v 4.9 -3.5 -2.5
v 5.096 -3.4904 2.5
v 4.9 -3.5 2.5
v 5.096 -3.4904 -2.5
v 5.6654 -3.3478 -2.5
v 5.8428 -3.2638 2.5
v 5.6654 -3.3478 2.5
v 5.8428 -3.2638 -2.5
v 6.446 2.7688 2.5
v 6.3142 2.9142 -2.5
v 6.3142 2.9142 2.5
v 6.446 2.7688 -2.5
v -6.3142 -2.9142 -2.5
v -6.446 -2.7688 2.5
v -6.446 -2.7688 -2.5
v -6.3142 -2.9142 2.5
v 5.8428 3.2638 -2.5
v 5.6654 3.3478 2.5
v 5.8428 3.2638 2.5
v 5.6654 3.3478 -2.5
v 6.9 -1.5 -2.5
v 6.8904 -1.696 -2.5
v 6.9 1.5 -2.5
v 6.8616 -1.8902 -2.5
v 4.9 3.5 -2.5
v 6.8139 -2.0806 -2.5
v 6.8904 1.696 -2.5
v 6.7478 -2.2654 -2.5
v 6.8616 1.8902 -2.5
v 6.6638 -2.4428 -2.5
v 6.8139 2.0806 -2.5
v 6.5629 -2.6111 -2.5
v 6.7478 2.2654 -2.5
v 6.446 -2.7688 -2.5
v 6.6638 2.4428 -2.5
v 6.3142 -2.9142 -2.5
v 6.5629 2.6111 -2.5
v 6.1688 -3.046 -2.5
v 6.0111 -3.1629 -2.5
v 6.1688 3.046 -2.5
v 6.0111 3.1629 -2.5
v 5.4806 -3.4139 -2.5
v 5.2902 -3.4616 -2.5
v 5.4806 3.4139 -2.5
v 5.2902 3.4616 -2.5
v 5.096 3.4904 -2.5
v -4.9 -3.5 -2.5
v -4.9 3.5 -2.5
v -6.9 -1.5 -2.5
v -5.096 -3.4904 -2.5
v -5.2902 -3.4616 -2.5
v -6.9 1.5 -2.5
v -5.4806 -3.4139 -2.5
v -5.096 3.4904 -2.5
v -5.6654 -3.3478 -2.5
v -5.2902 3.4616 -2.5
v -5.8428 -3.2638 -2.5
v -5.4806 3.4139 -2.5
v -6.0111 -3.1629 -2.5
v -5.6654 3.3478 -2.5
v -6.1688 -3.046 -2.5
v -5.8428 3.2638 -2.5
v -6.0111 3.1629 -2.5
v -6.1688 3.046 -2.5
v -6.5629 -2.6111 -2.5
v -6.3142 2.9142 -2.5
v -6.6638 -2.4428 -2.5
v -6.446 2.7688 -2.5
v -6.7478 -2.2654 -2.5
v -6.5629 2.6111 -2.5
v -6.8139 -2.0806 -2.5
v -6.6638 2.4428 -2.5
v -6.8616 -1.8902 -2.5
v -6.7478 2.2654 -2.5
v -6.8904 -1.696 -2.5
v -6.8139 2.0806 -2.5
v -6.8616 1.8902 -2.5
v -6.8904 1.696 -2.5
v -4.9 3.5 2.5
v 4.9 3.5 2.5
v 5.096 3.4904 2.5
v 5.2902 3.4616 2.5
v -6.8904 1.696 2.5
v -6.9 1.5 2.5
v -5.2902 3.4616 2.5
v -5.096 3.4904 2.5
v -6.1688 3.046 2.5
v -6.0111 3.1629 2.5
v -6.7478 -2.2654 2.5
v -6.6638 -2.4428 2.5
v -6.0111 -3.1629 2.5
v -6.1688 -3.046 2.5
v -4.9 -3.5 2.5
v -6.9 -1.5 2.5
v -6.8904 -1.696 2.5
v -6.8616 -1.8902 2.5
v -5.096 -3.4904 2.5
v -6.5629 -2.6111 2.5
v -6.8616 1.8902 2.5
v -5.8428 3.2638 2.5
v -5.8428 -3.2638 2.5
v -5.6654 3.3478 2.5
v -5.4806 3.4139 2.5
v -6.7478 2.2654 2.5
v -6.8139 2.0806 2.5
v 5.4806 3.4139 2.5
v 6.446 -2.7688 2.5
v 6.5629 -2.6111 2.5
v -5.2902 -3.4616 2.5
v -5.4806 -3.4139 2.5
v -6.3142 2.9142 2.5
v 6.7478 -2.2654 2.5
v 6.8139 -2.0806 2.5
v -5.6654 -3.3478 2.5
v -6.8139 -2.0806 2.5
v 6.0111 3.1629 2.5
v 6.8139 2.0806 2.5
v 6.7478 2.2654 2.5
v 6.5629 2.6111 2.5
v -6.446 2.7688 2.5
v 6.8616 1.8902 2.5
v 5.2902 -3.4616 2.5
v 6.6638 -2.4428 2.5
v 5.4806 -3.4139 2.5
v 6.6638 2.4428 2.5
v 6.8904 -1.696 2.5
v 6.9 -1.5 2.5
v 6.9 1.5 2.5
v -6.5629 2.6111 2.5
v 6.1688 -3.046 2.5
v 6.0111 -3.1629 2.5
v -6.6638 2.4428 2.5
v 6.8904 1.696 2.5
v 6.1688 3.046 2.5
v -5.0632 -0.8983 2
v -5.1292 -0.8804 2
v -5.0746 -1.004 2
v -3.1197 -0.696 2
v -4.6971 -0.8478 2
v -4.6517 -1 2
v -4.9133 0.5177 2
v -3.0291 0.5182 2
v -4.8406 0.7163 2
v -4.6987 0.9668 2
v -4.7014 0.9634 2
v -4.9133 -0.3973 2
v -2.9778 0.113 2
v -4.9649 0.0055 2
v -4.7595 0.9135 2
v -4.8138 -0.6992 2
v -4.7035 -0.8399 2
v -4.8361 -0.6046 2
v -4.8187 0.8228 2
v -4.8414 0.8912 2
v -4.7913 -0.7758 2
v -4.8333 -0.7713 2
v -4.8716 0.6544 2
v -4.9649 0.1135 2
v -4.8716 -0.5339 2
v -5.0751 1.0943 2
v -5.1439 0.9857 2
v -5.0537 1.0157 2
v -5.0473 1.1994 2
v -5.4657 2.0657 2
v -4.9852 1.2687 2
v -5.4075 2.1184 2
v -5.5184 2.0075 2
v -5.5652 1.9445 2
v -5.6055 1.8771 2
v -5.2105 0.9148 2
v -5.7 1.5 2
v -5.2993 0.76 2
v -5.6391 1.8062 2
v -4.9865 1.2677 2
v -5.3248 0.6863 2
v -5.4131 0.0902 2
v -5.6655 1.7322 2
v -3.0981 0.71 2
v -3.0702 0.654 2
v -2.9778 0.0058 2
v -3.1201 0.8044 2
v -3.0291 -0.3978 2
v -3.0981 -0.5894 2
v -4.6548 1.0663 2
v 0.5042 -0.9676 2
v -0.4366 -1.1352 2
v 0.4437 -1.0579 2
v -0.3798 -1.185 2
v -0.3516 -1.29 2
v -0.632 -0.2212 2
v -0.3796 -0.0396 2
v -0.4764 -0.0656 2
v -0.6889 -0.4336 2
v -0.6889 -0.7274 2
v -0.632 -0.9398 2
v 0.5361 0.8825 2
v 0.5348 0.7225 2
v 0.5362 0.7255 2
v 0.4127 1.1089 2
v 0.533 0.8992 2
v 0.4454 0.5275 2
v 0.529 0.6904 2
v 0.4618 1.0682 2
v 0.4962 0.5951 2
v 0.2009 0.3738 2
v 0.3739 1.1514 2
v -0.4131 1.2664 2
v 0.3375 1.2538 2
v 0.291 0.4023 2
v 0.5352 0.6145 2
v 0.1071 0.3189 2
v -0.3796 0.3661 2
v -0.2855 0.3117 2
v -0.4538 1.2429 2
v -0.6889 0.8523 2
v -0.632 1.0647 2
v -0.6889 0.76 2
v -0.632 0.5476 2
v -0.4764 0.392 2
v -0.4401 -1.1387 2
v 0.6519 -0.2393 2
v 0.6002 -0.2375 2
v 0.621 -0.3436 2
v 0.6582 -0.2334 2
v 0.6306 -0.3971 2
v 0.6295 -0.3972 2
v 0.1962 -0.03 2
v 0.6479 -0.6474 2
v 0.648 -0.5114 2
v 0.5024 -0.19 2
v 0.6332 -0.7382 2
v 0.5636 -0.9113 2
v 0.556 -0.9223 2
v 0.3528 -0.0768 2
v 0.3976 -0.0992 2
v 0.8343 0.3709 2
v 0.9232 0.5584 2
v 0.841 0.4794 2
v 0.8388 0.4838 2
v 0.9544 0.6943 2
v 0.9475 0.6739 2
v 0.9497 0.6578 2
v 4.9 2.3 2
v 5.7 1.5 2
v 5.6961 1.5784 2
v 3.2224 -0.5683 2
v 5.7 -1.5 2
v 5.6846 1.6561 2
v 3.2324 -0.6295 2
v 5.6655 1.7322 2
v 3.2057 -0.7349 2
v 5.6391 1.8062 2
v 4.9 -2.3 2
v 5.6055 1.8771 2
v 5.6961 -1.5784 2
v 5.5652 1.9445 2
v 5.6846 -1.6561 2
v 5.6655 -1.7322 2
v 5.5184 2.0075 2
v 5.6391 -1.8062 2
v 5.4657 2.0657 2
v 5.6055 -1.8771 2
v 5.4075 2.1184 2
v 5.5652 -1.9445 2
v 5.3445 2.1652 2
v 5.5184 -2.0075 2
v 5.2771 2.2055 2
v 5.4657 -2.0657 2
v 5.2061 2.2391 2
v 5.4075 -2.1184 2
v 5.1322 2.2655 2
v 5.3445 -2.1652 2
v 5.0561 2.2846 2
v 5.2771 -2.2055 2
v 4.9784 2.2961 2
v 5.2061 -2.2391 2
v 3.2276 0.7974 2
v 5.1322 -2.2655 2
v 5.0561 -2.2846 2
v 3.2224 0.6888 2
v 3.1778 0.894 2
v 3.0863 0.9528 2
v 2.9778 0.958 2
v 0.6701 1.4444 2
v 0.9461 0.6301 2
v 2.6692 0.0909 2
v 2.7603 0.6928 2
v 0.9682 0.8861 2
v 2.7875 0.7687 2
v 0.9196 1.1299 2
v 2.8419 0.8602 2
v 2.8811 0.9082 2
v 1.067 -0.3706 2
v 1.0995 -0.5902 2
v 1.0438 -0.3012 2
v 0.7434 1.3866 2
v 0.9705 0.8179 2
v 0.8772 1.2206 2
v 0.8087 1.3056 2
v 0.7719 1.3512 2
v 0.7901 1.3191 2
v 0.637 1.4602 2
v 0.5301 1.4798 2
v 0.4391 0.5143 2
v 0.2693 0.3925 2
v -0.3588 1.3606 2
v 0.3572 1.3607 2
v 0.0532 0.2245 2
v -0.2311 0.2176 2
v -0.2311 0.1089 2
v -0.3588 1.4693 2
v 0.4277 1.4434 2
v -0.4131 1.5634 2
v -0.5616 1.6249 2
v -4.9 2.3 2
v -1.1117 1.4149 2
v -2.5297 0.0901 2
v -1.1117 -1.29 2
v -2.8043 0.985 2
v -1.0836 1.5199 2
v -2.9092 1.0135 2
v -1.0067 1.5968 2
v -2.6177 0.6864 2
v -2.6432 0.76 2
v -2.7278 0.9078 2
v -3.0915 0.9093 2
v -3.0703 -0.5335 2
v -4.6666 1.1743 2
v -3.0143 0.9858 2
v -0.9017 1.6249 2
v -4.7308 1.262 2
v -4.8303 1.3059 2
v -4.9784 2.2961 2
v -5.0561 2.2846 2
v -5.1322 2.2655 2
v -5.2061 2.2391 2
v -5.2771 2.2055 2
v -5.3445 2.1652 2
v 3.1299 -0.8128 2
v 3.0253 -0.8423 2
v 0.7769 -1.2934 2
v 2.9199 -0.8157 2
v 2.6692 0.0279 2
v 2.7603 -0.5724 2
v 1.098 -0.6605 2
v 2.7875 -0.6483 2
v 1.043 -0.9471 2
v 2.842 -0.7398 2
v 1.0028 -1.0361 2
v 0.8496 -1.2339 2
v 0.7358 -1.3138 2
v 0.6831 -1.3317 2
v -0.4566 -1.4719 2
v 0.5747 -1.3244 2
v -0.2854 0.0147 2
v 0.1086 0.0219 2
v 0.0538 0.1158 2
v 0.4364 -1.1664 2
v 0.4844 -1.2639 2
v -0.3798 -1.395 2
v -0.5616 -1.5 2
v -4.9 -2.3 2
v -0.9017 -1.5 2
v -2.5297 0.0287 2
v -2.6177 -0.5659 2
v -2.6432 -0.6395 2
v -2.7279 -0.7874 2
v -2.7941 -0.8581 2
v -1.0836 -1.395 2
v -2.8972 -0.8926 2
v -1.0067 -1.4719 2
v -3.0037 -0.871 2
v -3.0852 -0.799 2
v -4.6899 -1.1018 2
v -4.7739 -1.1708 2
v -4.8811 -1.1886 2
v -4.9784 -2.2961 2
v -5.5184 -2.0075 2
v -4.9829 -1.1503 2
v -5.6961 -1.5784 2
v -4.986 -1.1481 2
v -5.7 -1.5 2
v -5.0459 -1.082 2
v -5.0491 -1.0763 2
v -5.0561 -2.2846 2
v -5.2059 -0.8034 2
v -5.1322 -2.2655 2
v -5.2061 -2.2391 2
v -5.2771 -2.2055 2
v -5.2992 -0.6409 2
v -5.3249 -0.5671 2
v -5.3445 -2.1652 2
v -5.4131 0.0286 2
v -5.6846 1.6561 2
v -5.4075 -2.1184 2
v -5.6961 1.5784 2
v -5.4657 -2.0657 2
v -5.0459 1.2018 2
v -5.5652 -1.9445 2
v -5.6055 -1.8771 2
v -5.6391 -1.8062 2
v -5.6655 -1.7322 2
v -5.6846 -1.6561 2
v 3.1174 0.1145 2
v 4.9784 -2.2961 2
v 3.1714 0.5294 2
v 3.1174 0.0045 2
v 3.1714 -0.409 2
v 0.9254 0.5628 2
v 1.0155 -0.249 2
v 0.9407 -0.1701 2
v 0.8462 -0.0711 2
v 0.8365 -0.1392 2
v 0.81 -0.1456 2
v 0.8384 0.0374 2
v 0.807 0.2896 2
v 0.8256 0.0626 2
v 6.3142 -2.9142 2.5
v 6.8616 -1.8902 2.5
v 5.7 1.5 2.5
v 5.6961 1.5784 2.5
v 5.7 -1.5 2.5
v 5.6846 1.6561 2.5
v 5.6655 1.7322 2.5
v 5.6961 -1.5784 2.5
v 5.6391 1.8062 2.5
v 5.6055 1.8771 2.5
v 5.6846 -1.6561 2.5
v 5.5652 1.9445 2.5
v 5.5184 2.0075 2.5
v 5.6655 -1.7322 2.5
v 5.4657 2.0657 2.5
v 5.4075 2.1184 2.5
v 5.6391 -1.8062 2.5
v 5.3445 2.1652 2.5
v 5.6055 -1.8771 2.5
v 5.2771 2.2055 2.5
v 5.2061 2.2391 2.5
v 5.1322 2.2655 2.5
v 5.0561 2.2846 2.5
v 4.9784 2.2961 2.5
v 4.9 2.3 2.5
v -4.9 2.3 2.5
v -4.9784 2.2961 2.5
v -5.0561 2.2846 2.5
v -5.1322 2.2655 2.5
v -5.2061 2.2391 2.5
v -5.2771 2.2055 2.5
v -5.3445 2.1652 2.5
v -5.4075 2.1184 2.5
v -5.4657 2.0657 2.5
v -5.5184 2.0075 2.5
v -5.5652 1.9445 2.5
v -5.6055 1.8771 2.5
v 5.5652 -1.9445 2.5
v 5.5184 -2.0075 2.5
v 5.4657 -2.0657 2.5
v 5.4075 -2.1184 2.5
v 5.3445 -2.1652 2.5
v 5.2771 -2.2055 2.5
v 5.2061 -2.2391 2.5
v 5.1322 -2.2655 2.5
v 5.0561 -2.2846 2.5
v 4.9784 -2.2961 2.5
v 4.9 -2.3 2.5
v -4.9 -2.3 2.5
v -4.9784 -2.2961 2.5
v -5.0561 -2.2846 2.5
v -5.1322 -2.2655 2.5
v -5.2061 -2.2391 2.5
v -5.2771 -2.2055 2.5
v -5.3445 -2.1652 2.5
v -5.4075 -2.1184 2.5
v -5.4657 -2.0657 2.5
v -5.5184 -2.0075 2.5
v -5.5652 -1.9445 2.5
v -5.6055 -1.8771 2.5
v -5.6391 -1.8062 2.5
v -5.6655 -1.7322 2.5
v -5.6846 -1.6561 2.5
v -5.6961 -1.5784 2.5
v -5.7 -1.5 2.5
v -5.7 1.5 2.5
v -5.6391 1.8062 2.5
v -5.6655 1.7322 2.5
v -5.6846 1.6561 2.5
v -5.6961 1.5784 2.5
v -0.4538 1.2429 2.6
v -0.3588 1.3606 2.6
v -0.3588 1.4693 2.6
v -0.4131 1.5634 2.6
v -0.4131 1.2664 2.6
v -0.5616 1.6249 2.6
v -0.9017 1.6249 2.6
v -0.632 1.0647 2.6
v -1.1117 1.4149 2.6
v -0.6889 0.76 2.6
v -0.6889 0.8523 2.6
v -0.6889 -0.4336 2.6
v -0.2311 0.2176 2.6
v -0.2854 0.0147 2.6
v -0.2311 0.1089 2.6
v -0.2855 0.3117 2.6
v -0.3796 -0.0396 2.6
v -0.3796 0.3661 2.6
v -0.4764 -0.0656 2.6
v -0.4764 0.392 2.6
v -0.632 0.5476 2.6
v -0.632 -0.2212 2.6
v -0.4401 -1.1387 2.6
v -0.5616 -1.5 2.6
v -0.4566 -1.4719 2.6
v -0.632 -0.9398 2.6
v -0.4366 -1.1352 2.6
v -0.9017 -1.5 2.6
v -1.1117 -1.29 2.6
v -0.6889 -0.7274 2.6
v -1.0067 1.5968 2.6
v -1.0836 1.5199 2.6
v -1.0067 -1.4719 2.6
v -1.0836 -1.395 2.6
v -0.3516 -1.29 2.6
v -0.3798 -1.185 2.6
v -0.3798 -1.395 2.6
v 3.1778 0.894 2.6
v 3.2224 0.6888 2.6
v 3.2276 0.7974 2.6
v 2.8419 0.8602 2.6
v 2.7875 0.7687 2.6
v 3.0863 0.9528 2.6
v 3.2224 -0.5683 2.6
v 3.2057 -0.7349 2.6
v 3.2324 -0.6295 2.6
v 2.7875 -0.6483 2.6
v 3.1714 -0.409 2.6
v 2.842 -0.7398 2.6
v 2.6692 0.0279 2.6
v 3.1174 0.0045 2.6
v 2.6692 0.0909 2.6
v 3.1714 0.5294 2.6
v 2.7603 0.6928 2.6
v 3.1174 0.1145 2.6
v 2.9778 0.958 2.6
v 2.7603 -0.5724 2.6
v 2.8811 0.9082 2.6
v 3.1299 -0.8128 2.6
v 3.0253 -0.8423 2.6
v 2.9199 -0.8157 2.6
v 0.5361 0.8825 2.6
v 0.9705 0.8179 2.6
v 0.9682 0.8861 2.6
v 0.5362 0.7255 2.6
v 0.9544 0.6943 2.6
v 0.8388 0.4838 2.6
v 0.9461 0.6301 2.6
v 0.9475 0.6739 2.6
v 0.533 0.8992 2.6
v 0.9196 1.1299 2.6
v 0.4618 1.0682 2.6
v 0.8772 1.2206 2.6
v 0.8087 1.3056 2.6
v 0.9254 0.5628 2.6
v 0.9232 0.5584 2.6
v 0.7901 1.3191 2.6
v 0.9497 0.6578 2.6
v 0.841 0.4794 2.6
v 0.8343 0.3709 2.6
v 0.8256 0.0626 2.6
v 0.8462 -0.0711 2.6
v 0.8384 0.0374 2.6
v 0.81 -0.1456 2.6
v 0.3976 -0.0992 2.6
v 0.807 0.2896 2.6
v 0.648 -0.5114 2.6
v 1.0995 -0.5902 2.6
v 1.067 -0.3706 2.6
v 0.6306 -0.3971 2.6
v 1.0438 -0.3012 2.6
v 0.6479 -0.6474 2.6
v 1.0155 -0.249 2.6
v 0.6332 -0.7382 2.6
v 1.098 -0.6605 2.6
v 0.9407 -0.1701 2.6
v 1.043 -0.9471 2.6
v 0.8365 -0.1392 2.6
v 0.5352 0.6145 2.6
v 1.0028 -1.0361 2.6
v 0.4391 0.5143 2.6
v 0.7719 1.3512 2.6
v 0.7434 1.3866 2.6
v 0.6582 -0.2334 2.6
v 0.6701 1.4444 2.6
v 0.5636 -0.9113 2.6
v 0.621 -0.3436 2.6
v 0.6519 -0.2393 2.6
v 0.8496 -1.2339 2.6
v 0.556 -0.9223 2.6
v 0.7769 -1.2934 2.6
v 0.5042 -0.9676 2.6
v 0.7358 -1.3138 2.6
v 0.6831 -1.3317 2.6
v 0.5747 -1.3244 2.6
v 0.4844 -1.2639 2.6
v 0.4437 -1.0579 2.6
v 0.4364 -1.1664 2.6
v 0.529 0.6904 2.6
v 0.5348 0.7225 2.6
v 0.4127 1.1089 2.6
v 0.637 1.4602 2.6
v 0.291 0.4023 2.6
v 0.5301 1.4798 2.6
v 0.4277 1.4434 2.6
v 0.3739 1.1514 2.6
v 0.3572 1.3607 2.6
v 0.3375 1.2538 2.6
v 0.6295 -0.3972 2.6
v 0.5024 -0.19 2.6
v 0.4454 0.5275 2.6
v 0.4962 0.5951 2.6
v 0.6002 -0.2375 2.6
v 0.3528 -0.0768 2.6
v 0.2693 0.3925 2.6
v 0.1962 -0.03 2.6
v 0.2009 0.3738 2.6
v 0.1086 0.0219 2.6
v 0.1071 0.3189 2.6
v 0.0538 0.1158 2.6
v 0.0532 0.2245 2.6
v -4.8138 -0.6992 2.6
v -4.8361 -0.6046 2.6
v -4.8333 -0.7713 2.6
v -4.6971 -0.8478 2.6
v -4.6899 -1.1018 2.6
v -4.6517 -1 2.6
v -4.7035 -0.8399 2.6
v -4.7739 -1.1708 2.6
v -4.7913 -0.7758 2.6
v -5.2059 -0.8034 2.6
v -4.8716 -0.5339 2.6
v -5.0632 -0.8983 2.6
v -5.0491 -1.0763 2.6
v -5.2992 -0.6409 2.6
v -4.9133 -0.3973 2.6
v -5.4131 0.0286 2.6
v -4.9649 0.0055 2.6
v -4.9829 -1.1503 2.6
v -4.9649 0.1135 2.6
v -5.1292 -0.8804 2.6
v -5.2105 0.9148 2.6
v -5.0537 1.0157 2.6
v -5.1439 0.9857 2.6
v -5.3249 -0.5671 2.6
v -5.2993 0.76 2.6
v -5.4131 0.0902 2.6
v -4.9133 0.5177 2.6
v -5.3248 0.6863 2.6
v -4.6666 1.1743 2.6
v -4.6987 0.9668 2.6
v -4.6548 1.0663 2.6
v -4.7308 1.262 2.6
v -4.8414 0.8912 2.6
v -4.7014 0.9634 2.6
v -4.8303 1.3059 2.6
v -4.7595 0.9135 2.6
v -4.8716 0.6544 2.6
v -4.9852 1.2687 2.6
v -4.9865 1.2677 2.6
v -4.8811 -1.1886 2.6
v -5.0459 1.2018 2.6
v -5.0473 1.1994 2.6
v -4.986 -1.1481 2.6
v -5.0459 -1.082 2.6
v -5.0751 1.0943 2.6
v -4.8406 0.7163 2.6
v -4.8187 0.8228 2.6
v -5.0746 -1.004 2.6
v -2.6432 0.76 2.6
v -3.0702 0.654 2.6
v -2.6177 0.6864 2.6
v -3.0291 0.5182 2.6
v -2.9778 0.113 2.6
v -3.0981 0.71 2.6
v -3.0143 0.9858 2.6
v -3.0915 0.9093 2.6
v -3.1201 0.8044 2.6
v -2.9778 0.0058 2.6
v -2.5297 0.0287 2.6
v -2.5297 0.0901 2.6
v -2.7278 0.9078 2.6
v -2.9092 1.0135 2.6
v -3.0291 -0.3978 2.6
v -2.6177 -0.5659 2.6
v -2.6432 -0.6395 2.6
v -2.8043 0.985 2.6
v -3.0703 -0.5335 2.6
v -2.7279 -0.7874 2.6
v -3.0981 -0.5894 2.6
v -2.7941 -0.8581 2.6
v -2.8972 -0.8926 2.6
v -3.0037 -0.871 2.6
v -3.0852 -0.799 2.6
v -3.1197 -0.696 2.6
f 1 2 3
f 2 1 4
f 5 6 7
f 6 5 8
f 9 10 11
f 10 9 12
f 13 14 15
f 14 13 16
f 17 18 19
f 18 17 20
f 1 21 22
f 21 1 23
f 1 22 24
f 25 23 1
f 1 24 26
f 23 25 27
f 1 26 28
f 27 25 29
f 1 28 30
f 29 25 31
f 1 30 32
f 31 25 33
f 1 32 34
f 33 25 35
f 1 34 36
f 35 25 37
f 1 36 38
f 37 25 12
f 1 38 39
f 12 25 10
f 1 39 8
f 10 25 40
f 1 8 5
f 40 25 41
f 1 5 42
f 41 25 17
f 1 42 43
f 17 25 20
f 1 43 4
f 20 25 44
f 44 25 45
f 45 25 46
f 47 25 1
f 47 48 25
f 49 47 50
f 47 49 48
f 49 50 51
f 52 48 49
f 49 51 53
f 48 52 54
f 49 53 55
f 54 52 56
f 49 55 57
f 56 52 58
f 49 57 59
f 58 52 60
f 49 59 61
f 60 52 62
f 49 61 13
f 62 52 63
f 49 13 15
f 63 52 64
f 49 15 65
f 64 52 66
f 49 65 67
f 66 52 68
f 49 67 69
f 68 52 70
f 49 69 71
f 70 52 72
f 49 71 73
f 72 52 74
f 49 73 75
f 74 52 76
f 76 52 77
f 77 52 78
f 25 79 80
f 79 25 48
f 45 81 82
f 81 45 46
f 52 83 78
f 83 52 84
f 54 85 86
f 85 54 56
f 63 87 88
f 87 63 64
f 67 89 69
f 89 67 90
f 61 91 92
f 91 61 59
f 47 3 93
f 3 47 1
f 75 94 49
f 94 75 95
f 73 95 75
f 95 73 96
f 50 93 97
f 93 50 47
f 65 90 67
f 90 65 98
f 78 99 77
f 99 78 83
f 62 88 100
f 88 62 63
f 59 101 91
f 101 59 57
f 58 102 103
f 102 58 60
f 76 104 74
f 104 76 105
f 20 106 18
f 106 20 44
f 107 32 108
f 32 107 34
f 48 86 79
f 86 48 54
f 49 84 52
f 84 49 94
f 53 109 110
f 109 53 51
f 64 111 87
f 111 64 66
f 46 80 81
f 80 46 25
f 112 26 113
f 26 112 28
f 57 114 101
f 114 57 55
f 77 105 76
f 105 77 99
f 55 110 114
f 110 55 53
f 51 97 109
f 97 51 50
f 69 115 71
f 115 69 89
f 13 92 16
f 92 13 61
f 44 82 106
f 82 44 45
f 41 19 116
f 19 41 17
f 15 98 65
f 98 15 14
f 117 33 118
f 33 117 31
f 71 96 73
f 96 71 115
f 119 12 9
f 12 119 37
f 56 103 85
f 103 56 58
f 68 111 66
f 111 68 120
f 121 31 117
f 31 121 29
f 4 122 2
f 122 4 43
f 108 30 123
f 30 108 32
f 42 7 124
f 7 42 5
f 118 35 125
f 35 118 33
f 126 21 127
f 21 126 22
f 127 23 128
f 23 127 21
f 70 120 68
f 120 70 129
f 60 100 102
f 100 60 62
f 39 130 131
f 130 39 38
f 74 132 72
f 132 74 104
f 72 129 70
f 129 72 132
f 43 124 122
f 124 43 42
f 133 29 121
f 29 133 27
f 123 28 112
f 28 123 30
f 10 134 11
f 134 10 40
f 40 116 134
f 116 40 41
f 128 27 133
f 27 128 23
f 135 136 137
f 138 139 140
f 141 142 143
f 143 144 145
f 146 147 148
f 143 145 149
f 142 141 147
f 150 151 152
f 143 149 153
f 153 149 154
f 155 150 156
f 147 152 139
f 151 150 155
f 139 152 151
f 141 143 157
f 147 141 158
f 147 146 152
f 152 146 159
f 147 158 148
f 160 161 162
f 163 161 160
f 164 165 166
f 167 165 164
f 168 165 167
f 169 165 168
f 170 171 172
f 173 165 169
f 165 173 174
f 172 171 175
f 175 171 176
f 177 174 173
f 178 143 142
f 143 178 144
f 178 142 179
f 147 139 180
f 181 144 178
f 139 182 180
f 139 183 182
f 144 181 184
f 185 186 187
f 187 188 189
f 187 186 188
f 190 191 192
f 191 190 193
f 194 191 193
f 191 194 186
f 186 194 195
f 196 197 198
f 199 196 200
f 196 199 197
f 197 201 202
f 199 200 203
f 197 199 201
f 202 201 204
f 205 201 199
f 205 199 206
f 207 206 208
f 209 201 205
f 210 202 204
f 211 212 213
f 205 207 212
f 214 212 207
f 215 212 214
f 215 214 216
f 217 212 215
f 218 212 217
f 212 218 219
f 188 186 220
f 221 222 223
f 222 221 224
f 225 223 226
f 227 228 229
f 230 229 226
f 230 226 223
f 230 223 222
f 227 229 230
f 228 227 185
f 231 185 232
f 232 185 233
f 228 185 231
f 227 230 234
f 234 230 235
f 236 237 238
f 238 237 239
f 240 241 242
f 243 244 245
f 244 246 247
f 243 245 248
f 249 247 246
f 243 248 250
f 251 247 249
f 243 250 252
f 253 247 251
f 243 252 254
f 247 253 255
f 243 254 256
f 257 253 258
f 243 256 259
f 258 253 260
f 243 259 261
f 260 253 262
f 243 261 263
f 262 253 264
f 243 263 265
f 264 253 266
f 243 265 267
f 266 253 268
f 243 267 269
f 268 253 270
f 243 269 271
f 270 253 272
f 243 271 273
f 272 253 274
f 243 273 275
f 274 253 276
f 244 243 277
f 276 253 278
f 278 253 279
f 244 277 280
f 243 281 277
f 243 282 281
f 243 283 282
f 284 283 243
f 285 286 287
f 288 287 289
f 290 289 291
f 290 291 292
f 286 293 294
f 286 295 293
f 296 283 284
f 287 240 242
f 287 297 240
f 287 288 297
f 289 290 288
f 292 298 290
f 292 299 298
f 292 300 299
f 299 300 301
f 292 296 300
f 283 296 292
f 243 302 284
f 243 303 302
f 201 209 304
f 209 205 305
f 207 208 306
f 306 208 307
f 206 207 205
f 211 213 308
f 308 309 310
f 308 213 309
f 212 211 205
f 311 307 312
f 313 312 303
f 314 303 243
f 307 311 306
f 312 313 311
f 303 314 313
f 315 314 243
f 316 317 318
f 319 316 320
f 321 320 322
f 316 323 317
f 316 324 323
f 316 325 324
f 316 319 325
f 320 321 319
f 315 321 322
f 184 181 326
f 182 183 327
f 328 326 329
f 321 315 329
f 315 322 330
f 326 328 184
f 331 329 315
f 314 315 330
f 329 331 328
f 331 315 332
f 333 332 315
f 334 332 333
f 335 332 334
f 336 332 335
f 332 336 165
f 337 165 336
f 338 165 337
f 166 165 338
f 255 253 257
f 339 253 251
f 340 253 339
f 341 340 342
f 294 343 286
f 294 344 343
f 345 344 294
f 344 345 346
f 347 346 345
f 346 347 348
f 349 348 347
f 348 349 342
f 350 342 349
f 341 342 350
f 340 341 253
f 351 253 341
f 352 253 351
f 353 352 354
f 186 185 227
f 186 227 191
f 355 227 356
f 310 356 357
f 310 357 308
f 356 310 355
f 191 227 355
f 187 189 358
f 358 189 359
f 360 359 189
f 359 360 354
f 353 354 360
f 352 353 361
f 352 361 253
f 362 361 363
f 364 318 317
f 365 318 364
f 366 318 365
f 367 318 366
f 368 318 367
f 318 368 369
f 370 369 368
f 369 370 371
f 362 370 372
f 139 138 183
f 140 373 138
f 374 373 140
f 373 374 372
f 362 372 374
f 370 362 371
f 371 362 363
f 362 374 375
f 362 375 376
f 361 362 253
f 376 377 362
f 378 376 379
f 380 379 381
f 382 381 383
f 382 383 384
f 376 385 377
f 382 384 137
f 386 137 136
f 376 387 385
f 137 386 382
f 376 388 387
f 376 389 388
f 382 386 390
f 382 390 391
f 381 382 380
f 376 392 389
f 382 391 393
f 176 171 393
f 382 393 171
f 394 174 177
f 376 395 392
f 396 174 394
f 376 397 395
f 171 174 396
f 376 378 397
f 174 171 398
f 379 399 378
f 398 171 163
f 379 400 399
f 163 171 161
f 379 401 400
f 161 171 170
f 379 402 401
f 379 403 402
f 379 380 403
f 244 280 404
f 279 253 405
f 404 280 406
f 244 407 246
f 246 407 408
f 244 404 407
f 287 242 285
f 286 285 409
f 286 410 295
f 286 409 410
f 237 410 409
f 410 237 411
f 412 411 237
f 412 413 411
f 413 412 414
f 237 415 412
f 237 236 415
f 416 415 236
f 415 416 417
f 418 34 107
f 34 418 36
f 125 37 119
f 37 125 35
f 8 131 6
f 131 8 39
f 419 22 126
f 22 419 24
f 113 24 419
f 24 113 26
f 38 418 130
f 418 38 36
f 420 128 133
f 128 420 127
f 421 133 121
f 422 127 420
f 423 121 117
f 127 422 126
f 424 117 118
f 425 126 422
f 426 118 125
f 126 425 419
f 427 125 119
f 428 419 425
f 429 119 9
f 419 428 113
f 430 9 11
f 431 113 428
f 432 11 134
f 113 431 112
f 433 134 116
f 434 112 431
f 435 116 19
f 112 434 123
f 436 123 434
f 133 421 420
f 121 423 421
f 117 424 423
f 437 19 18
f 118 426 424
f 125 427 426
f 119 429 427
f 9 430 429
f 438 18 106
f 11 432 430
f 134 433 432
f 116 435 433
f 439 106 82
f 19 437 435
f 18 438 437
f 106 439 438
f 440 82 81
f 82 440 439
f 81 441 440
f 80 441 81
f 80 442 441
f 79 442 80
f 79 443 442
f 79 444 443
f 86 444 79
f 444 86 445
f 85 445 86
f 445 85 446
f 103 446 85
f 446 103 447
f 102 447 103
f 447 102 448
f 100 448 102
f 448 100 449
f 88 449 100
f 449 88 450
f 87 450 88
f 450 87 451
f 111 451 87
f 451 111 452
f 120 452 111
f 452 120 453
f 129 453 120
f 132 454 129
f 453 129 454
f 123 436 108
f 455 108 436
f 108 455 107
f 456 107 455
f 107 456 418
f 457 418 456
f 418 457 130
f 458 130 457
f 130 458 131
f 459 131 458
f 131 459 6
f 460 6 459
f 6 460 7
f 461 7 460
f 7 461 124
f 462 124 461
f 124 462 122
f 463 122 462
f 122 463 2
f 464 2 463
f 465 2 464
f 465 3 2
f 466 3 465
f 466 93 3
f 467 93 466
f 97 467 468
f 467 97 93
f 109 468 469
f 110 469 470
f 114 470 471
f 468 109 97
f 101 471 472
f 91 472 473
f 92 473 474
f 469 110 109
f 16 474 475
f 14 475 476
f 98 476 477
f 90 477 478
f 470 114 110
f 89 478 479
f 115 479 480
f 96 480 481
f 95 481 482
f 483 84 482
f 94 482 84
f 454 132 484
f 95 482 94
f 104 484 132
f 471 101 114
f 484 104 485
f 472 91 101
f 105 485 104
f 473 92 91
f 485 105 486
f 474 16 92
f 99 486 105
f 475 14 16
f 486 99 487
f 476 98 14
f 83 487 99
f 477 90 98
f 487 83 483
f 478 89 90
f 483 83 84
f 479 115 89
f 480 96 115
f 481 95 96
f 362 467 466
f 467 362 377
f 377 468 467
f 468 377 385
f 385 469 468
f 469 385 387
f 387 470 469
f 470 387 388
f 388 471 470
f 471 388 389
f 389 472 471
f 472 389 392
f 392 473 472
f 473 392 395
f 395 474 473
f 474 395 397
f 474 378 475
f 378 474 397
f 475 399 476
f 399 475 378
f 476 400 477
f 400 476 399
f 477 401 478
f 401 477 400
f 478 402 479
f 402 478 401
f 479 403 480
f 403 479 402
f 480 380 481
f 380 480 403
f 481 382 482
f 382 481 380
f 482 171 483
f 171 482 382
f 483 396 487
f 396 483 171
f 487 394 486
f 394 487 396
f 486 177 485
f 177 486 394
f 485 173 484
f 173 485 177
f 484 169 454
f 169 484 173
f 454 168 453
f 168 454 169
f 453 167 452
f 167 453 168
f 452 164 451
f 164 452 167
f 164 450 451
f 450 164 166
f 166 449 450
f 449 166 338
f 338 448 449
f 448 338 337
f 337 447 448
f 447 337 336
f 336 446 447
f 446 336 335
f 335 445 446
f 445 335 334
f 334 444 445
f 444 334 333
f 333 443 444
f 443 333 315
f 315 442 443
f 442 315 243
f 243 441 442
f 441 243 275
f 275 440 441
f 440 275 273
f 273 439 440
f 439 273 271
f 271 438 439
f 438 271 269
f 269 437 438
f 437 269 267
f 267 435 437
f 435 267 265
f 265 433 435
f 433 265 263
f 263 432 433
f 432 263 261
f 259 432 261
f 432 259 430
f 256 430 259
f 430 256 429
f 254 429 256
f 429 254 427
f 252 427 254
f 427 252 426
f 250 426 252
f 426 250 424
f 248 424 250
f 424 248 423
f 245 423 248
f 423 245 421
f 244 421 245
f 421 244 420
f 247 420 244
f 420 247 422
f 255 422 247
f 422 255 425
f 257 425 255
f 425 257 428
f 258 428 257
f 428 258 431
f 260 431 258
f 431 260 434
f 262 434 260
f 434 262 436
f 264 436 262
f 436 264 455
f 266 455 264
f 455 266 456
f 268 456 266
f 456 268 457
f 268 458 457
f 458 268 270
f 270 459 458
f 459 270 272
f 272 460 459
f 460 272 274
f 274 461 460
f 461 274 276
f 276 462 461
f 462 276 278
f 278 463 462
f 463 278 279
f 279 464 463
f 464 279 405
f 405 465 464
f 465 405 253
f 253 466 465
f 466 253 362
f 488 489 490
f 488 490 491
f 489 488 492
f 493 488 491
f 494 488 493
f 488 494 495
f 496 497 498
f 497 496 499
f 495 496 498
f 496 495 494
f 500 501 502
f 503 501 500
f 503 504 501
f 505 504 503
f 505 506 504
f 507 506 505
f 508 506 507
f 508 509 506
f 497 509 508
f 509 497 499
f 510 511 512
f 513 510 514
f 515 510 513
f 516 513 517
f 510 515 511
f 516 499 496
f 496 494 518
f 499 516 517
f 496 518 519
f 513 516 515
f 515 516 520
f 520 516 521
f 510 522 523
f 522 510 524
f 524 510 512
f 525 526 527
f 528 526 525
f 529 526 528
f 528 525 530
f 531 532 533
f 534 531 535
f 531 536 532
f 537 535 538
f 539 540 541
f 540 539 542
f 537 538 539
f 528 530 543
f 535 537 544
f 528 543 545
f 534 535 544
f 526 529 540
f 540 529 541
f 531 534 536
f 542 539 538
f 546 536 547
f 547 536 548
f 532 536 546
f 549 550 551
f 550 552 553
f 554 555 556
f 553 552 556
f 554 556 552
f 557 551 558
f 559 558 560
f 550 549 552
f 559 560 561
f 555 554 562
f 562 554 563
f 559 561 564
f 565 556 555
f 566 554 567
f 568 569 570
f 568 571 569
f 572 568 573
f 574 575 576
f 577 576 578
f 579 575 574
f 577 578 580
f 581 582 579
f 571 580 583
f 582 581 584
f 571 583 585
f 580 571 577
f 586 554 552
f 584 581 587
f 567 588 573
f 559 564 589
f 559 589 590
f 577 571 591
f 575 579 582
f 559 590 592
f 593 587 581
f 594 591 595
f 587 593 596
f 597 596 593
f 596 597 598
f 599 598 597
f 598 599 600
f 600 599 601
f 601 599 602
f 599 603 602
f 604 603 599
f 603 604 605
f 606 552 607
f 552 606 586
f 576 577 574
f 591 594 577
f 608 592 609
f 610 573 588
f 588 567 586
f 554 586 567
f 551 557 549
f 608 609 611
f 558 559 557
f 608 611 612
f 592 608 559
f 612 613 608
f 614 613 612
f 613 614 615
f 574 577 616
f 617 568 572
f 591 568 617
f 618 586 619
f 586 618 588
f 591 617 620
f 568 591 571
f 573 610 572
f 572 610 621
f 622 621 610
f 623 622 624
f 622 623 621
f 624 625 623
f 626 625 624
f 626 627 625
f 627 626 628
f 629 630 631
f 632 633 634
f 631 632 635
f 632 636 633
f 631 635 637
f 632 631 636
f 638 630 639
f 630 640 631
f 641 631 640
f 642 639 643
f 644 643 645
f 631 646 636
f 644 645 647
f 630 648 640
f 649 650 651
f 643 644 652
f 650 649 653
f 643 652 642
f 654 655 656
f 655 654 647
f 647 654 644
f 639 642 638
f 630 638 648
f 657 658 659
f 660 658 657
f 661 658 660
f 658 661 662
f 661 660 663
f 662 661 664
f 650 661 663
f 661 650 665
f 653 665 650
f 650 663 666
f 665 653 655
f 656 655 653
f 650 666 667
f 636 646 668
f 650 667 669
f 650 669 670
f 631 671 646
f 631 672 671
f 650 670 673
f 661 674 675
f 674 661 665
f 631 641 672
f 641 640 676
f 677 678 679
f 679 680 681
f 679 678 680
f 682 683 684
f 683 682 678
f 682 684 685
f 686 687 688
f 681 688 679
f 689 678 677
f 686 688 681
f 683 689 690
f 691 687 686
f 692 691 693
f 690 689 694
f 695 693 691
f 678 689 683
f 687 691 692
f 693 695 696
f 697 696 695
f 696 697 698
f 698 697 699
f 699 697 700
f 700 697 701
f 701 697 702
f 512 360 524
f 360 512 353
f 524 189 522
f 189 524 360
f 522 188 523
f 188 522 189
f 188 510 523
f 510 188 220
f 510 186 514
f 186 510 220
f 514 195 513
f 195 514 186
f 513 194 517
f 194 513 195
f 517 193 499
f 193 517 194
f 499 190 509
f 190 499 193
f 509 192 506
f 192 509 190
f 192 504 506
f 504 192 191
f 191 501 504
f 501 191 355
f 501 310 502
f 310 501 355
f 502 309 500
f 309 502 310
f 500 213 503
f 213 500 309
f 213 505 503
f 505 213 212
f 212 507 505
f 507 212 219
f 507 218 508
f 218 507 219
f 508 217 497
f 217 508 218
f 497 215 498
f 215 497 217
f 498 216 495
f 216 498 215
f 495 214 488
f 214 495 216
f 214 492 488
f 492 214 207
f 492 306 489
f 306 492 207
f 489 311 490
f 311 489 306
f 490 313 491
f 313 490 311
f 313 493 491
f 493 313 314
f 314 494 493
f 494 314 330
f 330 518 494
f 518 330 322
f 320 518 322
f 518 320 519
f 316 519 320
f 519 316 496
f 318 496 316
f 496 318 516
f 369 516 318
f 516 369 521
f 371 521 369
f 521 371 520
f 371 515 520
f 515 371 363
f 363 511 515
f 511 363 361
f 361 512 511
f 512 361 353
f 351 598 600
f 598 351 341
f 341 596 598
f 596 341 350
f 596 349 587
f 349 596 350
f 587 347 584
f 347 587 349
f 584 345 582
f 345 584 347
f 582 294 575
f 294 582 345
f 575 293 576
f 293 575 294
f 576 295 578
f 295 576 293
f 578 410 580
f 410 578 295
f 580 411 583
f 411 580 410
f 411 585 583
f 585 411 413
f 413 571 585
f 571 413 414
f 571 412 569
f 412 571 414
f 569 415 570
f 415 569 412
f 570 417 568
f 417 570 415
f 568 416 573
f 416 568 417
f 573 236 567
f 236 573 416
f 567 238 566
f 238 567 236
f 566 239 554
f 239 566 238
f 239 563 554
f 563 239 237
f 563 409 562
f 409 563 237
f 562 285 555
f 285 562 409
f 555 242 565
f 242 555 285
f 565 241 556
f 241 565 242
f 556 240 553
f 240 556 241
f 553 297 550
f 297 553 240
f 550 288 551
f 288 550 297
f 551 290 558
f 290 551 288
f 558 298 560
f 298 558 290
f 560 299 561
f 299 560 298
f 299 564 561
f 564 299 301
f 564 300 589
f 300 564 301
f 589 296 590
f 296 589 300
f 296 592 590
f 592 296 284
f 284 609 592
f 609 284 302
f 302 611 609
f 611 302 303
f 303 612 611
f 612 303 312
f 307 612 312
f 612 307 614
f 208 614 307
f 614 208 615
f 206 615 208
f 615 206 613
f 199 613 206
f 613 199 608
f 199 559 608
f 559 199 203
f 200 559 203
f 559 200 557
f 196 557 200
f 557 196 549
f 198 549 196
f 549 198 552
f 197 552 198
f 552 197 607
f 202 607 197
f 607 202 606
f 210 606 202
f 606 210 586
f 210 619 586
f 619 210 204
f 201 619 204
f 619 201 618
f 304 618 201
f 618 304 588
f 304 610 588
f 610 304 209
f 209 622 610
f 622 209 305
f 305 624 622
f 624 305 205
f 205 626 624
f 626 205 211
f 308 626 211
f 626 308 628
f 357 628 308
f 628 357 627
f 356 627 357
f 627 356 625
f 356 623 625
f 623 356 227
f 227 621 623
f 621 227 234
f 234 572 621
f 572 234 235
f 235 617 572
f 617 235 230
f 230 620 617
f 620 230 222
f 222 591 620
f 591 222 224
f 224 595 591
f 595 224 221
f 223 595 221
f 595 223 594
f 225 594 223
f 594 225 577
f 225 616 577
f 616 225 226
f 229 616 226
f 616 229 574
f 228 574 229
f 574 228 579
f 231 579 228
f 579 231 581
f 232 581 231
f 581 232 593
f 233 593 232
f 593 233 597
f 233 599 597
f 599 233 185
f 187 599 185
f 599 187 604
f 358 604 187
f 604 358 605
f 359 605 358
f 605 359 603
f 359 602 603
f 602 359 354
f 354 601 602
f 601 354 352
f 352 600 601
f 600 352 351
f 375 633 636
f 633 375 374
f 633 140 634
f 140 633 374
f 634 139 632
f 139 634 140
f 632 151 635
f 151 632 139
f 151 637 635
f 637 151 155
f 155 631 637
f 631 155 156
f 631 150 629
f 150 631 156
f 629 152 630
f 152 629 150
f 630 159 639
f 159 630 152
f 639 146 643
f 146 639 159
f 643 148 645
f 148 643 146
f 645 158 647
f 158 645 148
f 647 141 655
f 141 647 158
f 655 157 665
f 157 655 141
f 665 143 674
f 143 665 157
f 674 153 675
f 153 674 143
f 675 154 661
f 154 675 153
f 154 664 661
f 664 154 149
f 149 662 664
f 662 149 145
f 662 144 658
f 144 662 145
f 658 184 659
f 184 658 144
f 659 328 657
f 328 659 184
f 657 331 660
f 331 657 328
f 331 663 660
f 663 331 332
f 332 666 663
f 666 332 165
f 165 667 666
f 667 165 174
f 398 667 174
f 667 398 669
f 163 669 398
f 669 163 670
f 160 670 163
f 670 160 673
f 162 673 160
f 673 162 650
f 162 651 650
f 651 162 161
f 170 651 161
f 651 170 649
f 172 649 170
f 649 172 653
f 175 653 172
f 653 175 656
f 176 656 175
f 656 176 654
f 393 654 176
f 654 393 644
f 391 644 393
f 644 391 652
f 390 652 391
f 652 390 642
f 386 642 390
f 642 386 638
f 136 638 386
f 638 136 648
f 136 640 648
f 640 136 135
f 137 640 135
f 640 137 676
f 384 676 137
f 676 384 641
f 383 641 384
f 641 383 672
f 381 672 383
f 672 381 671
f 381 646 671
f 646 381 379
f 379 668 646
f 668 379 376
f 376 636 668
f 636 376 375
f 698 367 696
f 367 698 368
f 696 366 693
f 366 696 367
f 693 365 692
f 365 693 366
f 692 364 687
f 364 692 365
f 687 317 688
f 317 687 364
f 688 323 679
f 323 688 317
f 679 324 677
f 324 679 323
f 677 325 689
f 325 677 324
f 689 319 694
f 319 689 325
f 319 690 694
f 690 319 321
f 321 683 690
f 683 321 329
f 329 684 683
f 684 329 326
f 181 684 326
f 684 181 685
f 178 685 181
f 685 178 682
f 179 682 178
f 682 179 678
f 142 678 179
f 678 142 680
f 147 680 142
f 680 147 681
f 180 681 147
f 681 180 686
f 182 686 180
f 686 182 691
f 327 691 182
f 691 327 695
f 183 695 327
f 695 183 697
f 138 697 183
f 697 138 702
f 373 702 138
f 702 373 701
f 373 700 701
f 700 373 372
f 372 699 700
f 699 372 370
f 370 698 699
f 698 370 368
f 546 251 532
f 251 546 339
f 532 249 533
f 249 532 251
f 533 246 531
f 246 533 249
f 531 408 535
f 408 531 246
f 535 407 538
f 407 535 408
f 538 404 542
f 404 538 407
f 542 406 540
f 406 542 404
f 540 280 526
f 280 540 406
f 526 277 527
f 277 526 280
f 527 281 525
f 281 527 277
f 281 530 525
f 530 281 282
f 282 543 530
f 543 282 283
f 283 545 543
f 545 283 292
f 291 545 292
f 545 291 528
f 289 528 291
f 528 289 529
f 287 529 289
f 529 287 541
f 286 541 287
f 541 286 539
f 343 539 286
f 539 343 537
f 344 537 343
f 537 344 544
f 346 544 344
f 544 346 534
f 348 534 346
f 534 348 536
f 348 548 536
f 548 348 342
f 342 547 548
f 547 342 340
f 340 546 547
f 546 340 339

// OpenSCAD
// file: ../../brand/obc_mark.scad
// The OBC maker's mark (2026-10-14), from the logo Scott chose: OBC in a heavy
// geometric face, struck through with horizontal stripes. One drawing for
// every model, so every print carries the same mark.
//
// It goes on the underside as an INLAY: the letters cut 0.6 mm in and filled
// in a contrasting colour, flush with the base. On a white base that reads as
// crisp dark letters straight off the bed; engraved white on white, the old
// mark barely showed. The logo's stripes become grooves one layer deep across
// the letters' face: each catches a shadow, like the ridges on the gold logo,
// and the letters stay whole in colour above them, so they read at any size.
//
// Struck right through the letters, as in the logo, the stripes failed both
// ways (2026-10-14): in plastic a stripe cannot be finer than two beads, so at
// 4-6 mm one stripe took out the B's middle bar and it stopped reading as a B,
// and at 8-10 mm the stripes were as wide as the letter between them and OBC
// broke up like a barcode.
//
//   obc_inlay(h)     the coloured part, h = cap height in mm: give it to the
//                    contrasting colour
//   obc_cut(h)       what to subtract from the base: the whole letters, so
//                    the grooves are open, not left in the base's colour
//   obc_engrave(h)   the same as a cutter, for a one-colour model
//   obc_mark_width(h)
// Both are mirrored to read from below, sit on z = 0 and are centred on the
// origin; translate them to the spot on the base.
// They read OBC when the piece is tipped back to look underneath: front edge
// (-y) away from you. That is how Scott turned his first cottage over, and
// the old mirror([1, 0, 0]) read "ƆᗺO" that way: right only if you turned
// the piece side to side instead (2026-10-25). tests/test_obc_mark_reading.py
// checks it from the real geometry.
//
// The letters are Montserrat ExtraBold, the logo's face, set 0.95 apart (the
// logo's are almost touching; in plastic every gap needs two beads, 0.9). The
// drawing is cleaned the way a nozzle draws, so what it shows is what prints.

OBC_FONT = "Montserrat:style=ExtraBold";
OBC_GAP = 0.95;             // between letters, and each groove's width
OBC_BAND = 1.1;             // letter face left between two grooves
OBC_INLAY = 0.6;            // the inlay's depth: three layers at 0.2
OBC_GROOVE = 0.2;           // the grooves' depth: the first layer

// glyph boxes at size 10, measured: [letter, ink start, ink width] (2026-10-14)
OBC_GLYPHS = [["O", 0.48, 10.79], ["B", 0.98, 9.24], ["C", 0.48, 9.52]];
function obc_u(h) = h / 9.72;                       // text size per mm of cap height
function obc_mark_width(h) = 29.55 * obc_u(h) + 2 * OBC_GAP;
function obc_grooves(h) = max(0, floor((h + OBC_GAP) / (OBC_BAND + OBC_GAP)) - 1);

module obc_letters(h) let (u = obc_u(h), x0 = -obc_mark_width(h) / 2) {
    for (i = [0 : 2]) let (g = OBC_GLYPHS[i],
            start = x0 + (i == 0 ? 0 : i == 1 ? 10.79 * u + OBC_GAP : (10.79 + 9.24) * u + 2 * OBC_GAP))
        translate([start - g[1] * u, -h / 2]) text(g[0], size = 10 * u, font = OBC_FONT, halign = "left", valign = "baseline");
}
module obc_grooves2d(h) let (n = obc_grooves(h), b = (h - n * OBC_GAP) / (n + 1))
    for (k = [1 : n]) translate([-50, -h / 2 + k * b + (k - 1) * OBC_GAP]) square([100, OBC_GAP]);

// cleaned as a nozzle draws: gaps under 0.85 closed, strokes under a bead opened
module obc_clean() offset(r = 0.21, $fn = 12) offset(delta = -0.21) offset(r = -0.425, $fn = 12) offset(delta = 0.425) children();

module obc_solid2d(h) obc_clean() obc_letters(h);                                   // the letters
module obc_face2d(h) obc_clean() difference() { obc_solid2d(h); obc_grooves2d(h); } // their face: the bands between grooves

// the coloured part: the face in the first layer, the whole letters above it.
// It stands 0.02 proud of its cut: exactly on it, the inlay's outline and the
// cut's met at near-coincident faces and the welded print had open edges
// round the letters (2026-10-14). Split into colours, the inlay takes the
// overlap, so the colour boundary does not move.
module obc_inlay(h, depth = OBC_INLAY) mirror([0, 1, 0]) {
    linear_extrude(OBC_GROOVE + 0.01) offset(delta = 0.02) obc_face2d(h);
    translate([0, 0, OBC_GROOVE]) linear_extrude(depth - OBC_GROOVE) offset(delta = 0.02) obc_solid2d(h);
}
module obc_cut(h, depth = OBC_INLAY) mirror([0, 1, 0]) translate([0, 0, -0.5]) linear_extrude(depth + 0.5) obc_solid2d(h);
// as a cutter: the face's bands in the first layer, the whole letters above,
// so the grooves stay at the face as ridges. Built from the same two shapes as
// the inlay: subtracting one cleaned outline from the other left slivers of
// no width and a mesh CGAL would not close (2026-10-21, its first use).
// inset > 0 pulls the cut in that far all round: the walls left between the
// letters and the ridges across them grow by twice it. A one-colour mark has no
// inlay to fill them, and at the logo's 0.95 they read as walls under the
// gate's 1.2 floor (the nativity, 2026-10-21).
// ridges = false cuts the letters whole: with no inlay above them, the ridges
// are strips one layer thick and the gate reads them as 0.2 mm walls.
module obc_engrave(h, depth = 0.8, inset = 0, ridges = true) mirror([0, 1, 0]) {
    if (ridges) {
        translate([0, 0, -0.5]) linear_extrude(0.5 + OBC_GROOVE + 0.01) offset(delta = -inset) obc_face2d(h);
        translate([0, 0, OBC_GROOVE]) linear_extrude(depth - OBC_GROOVE) offset(delta = -inset) obc_solid2d(h);
    } else translate([0, 0, -0.5]) linear_extrude(depth + 0.5) offset(delta = -inset) obc_solid2d(h);
}
// main file
// Urban Kid v3: the OBC nameplate, in its own frame: centred on the origin, back face on z = 0,
// front facing +z. build.py places it on the chest over the blank tag Benson's mesh has.
// The sizes are v1's (chain.scad), set for print at this scale: v1's own nameplate.
use <../../brand/obc_mark.scad>

PART = "all";       // "all", or "letters" (the raised detail, declared to the gate's wall check)
P_W = 13.8;
P_H = 7.0;
P_R = 2.0;
P_T = 2.0;          // 0.8 of it sinks into the hoodie (build.py)
BACK = 2.5;         // a block behind the plate, hidden in the hoodie, so the curved chest never leaves a gap
RIM = 1.2;
RIM_H = 0.5;
LET_H = 3.0;        // DETAIL_STANDARD: lettering >= 3 mm
LET_UP = 0.6;
$fn = 64;

module plate2d(inset = 0) offset(r = P_R - inset) square([P_W - 2 * P_R, P_H - 2 * P_R], center = true);
module letters() translate([0, 0, P_T - 0.01]) linear_extrude(LET_UP + 0.01) obc_solid2d(LET_H);

if (PART == "letters") letters();
else union() {
    translate([0, 0, -BACK]) linear_extrude(P_T + BACK) plate2d();
    translate([0, 0, P_T - 0.01]) linear_extrude(RIM_H + 0.01) difference() { plate2d(); plate2d(RIM); }
    letters();
}
